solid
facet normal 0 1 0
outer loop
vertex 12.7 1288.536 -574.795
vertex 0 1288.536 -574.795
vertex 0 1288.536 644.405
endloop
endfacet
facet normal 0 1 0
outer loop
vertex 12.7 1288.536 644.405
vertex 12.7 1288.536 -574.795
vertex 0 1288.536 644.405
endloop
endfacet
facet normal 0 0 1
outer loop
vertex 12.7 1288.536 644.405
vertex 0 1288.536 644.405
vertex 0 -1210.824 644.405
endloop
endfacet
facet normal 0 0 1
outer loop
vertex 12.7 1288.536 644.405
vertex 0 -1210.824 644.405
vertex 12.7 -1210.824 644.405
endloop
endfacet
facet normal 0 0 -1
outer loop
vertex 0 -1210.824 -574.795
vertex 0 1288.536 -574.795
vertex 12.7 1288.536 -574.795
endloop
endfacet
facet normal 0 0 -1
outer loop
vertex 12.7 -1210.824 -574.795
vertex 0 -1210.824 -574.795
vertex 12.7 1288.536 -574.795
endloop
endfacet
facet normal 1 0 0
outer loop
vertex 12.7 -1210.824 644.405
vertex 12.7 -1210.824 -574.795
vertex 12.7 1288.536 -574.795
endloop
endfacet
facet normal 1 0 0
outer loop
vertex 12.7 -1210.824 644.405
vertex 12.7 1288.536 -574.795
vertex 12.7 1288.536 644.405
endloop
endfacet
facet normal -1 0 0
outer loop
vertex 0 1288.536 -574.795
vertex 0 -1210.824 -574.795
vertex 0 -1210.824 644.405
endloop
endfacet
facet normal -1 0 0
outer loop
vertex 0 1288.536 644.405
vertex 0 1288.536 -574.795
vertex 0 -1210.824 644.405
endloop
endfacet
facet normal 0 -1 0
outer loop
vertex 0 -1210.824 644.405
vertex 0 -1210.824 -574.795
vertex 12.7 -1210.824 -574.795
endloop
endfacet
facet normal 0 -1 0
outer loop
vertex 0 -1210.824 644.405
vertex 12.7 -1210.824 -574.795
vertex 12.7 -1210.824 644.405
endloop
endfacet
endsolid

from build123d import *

# Parameters (mm, degrees)
F0_W     = 2438.4
F0_H     = 1219.2
F1_DEPTH = 12.7
F2_DEPTH = 45.72
F3_DEPTH = 15.24


with BuildPart() as f1:
    # F0 (on Right) → F1 (new body)
    with BuildSketch(Plane.YZ):
        with Locations((23.6157029867, 34.8047822451)):
            Rectangle(F0_W, F0_H)
    extrude(amount=F1_DEPTH)

    # F2 (add): a face of the model
    f2_faces = [f1.faces().sort_by_distance(p)[0] for p in [
        (6.35, 1242.8157029867, 34.8047822451),
    ]]
    extrude(f2_faces, amount=F2_DEPTH)

    # F3 (add): a face of the model
    f3_faces = [f1.faces().sort_by_distance(p)[0] for p in [
        (6.35, -1195.5842970133, 34.8047822451),
    ]]
    extrude(f3_faces, amount=F3_DEPTH)


solid = f1.part
